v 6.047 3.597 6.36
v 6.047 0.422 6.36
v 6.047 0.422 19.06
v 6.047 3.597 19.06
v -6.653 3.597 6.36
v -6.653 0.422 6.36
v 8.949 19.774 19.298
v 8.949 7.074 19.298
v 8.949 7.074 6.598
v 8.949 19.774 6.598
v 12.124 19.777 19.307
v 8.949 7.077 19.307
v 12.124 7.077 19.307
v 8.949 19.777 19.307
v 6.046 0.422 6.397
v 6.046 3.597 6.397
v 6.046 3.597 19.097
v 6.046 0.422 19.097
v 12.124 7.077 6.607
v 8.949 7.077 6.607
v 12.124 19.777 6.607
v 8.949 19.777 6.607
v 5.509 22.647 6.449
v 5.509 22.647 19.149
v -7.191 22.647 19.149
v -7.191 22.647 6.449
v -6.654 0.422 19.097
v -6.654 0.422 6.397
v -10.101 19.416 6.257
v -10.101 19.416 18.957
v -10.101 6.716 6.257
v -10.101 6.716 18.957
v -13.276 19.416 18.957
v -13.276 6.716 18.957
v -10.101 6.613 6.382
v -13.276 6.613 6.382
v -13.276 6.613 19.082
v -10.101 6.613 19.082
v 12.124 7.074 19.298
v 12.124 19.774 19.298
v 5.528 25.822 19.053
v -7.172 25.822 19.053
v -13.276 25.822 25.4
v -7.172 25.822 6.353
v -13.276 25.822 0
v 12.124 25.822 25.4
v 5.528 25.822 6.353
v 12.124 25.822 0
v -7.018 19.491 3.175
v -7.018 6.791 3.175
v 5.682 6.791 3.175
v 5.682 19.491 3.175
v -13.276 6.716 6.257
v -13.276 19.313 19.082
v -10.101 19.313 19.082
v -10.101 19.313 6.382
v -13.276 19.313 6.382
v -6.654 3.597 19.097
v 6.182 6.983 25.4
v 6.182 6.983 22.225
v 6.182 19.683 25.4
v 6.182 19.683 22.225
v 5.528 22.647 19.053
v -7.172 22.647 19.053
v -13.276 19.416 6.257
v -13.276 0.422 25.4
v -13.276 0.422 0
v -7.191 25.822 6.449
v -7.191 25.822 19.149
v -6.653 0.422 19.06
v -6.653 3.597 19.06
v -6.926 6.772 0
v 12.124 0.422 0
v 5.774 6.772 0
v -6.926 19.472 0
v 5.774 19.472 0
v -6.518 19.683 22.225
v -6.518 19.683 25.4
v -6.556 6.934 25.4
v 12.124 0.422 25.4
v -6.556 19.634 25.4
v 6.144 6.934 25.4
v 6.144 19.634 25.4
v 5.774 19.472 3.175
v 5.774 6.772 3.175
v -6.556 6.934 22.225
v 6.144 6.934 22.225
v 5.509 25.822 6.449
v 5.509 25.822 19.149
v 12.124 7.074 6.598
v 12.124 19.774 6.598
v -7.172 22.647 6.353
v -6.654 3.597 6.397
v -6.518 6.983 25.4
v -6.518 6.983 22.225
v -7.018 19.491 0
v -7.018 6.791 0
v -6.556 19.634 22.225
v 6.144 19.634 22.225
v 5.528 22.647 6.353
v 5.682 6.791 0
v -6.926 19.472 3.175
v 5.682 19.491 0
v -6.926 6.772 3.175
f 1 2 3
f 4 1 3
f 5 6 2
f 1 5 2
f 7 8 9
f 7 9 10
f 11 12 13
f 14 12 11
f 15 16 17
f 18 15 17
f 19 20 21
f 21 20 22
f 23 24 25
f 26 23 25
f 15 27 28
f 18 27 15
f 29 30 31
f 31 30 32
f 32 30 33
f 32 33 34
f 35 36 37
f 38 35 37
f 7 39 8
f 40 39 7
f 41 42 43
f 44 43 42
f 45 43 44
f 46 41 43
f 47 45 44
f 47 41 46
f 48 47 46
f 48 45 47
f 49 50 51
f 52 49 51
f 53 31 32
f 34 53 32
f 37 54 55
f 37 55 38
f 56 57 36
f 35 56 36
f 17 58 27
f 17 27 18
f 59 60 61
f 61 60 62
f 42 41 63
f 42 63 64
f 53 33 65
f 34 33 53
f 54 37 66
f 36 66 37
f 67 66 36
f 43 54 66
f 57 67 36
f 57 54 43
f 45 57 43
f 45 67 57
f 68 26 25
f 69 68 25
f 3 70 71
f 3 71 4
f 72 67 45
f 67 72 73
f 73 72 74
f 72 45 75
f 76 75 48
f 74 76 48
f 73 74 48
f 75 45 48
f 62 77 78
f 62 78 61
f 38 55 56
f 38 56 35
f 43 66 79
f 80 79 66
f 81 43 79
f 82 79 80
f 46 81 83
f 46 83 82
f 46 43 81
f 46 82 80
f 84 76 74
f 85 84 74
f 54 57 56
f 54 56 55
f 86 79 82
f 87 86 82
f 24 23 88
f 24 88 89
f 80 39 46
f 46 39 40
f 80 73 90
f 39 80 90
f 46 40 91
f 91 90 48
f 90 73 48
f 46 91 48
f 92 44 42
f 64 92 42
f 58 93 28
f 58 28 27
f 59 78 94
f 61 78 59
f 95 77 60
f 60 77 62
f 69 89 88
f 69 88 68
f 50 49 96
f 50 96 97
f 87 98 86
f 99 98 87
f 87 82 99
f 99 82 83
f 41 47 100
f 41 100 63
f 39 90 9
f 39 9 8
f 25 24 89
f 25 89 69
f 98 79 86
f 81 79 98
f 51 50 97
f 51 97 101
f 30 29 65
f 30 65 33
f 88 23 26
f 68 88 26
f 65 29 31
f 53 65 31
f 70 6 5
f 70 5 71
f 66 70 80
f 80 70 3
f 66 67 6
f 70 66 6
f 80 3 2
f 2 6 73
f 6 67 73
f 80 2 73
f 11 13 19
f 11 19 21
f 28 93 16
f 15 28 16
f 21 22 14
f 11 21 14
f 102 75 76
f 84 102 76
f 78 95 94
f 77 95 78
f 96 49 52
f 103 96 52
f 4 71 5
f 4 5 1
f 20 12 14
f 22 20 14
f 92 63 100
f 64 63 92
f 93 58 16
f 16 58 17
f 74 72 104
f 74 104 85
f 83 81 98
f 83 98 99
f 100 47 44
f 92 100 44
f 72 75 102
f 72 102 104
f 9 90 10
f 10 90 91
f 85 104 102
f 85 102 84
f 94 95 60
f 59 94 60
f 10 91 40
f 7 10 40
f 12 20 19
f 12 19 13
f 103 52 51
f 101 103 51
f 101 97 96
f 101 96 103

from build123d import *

# Parameters (mm, degrees)
F0_W      = 25.4
F0_H      = 25.4
F1_DEPTH  = 25.4
F2_W      = 12.7
F2_H      = 12.7
F3_DEPTH  = 3.175
F4_W      = 12.7
F4_H      = 12.7
F5_DEPTH  = 3.175
F6_W      = 12.7
F6_H      = 12.7
F7_DEPTH  = 3.175
F8_W      = 12.7
F8_H      = 12.7
F9_DEPTH  = 3.175
F10_W     = 12.7
F10_H     = 12.7
F11_DEPTH = 3.175
F12_W     = 12.7
F12_H     = 12.7
F13_DEPTH = 3.175
F14_W     = 12.7
F14_H     = 12.7
F15_DEPTH = 3.175
F16_W     = 12.7
F16_H     = 12.7
F17_DEPTH = 3.175
F18_W     = 12.7
F18_H     = 12.7
F19_DEPTH = 3.175
F20_W     = 12.7
F20_H     = 12.7
F21_DEPTH = 3.175
F22_W     = 12.7
F22_H     = 12.7
F23_DEPTH = 3.175
F24_W     = 12.7
F24_H     = 12.7
F25_DEPTH = 3.175


with BuildPart() as f1:
    # F0 (on Top) → F1 (new body)
    with BuildSketch(Plane.XY):
        with Locations((-0.575614, 13.121569)):
            Rectangle(F0_W, F0_H)
    extrude(amount=F1_DEPTH)

    # F2 (on face) → F3 (cut)
    with BuildSketch(Plane.XY.offset(25.4)):
        with Locations((-0.206075, 13.283891)):
            Rectangle(F2_W, F2_H)
    extrude(amount=-F3_DEPTH, mode=Mode.SUBTRACT)

    # F4 (on face) → F5 (cut)
    with BuildSketch(Plane(origin=(0, 0, 0), x_dir=(1, 0, 0), z_dir=(0, 0, -1))):
        with Locations((-0.575613, -13.121569)):
            Rectangle(F4_W, F4_H)
    extrude(amount=-F5_DEPTH, mode=Mode.SUBTRACT)

    # F6 (on face) → F7 (cut)
    with BuildSketch(Plane.XZ.offset(-0.421569)):
        with Locations((-0.30291, 12.710209)):
            Rectangle(F6_W, F6_H)
    extrude(amount=-F7_DEPTH, mode=Mode.SUBTRACT)

    # F8 (on face) → F9 (cut)
    with BuildSketch(Plane.YZ.offset(12.124386)):
        with Locations((13.424395, 12.947716)):
            Rectangle(F8_W, F8_H)
    extrude(amount=-F9_DEPTH, mode=Mode.SUBTRACT)

    # F10 (on face) → F11 (cut)
    with BuildSketch(Plane(origin=(0, 25.821569, 0), x_dir=(-1, 0, 0), z_dir=(0, 1, 0))):
        with Locations((0.822462, 12.703338)):
            Rectangle(F10_W, F10_H)
    extrude(amount=-F11_DEPTH, mode=Mode.SUBTRACT)

    # F12 (on face) → F13 (cut)
    with BuildSketch(Plane(origin=(-13.275614, 0, 0), x_dir=(0, -1, 0), z_dir=(-1, 0, 0))):
        with Locations((-12.962908, 12.731511)):
            Rectangle(F12_W, F12_H)
    extrude(amount=-F13_DEPTH, mode=Mode.SUBTRACT)


with BuildPart() as f15:
    # F14 (on face) → F15 (new body)
    with BuildSketch(Plane.XY.offset(22.225)):
        with Locations((-0.168473, 13.333316)):
            Rectangle(F14_W, F14_H)
    extrude(amount=F15_DEPTH)


with BuildPart() as f17:
    # F16 (on face) → F17 (new body)
    with BuildSketch(Plane.XZ.offset(-3.596569)):
        with Locations((-0.304332, 12.747079)):
            Rectangle(F16_W, F16_H)
    extrude(amount=F17_DEPTH)


with BuildPart() as f19:
    # F18 (on face) → F19 (new body)
    with BuildSketch(Plane.YZ.offset(8.949386)):
        with Locations((13.426993, 12.957202)):
            Rectangle(F18_W, F18_H)
    extrude(amount=F19_DEPTH)


with BuildPart() as f21:
    # F20 (on face) → F21 (new body)
    with BuildSketch(Plane(origin=(0, 22.646569, 0), x_dir=(-1, 0, 0), z_dir=(0, 1, 0))):
        with Locations((0.841133, 12.798705)):
            Rectangle(F20_W, F20_H)
    extrude(amount=F21_DEPTH)


with BuildPart() as f23:
    # F22 (on face) → F23 (new body)
    with BuildSketch(Plane(origin=(-10.100614, 0, 0), x_dir=(0, -1, 0), z_dir=(-1, 0, 0))):
        with Locations((-13.066313, 12.607197)):
            Rectangle(F22_W, F22_H)
    extrude(amount=F23_DEPTH)


with BuildPart() as f25:
    # F24 (on face) → F25 (new body)
    with BuildSketch(Plane(origin=(0, 0, 3.175), x_dir=(1, 0, 0), z_dir=(0, 0, -1))):
        with Locations((-0.667782, -13.140953)):
            Rectangle(F24_W, F24_H)
    extrude(amount=F25_DEPTH)


solid = Compound([f1.part, f15.part, f17.part, f19.part, f21.part, f23.part, f25.part])
